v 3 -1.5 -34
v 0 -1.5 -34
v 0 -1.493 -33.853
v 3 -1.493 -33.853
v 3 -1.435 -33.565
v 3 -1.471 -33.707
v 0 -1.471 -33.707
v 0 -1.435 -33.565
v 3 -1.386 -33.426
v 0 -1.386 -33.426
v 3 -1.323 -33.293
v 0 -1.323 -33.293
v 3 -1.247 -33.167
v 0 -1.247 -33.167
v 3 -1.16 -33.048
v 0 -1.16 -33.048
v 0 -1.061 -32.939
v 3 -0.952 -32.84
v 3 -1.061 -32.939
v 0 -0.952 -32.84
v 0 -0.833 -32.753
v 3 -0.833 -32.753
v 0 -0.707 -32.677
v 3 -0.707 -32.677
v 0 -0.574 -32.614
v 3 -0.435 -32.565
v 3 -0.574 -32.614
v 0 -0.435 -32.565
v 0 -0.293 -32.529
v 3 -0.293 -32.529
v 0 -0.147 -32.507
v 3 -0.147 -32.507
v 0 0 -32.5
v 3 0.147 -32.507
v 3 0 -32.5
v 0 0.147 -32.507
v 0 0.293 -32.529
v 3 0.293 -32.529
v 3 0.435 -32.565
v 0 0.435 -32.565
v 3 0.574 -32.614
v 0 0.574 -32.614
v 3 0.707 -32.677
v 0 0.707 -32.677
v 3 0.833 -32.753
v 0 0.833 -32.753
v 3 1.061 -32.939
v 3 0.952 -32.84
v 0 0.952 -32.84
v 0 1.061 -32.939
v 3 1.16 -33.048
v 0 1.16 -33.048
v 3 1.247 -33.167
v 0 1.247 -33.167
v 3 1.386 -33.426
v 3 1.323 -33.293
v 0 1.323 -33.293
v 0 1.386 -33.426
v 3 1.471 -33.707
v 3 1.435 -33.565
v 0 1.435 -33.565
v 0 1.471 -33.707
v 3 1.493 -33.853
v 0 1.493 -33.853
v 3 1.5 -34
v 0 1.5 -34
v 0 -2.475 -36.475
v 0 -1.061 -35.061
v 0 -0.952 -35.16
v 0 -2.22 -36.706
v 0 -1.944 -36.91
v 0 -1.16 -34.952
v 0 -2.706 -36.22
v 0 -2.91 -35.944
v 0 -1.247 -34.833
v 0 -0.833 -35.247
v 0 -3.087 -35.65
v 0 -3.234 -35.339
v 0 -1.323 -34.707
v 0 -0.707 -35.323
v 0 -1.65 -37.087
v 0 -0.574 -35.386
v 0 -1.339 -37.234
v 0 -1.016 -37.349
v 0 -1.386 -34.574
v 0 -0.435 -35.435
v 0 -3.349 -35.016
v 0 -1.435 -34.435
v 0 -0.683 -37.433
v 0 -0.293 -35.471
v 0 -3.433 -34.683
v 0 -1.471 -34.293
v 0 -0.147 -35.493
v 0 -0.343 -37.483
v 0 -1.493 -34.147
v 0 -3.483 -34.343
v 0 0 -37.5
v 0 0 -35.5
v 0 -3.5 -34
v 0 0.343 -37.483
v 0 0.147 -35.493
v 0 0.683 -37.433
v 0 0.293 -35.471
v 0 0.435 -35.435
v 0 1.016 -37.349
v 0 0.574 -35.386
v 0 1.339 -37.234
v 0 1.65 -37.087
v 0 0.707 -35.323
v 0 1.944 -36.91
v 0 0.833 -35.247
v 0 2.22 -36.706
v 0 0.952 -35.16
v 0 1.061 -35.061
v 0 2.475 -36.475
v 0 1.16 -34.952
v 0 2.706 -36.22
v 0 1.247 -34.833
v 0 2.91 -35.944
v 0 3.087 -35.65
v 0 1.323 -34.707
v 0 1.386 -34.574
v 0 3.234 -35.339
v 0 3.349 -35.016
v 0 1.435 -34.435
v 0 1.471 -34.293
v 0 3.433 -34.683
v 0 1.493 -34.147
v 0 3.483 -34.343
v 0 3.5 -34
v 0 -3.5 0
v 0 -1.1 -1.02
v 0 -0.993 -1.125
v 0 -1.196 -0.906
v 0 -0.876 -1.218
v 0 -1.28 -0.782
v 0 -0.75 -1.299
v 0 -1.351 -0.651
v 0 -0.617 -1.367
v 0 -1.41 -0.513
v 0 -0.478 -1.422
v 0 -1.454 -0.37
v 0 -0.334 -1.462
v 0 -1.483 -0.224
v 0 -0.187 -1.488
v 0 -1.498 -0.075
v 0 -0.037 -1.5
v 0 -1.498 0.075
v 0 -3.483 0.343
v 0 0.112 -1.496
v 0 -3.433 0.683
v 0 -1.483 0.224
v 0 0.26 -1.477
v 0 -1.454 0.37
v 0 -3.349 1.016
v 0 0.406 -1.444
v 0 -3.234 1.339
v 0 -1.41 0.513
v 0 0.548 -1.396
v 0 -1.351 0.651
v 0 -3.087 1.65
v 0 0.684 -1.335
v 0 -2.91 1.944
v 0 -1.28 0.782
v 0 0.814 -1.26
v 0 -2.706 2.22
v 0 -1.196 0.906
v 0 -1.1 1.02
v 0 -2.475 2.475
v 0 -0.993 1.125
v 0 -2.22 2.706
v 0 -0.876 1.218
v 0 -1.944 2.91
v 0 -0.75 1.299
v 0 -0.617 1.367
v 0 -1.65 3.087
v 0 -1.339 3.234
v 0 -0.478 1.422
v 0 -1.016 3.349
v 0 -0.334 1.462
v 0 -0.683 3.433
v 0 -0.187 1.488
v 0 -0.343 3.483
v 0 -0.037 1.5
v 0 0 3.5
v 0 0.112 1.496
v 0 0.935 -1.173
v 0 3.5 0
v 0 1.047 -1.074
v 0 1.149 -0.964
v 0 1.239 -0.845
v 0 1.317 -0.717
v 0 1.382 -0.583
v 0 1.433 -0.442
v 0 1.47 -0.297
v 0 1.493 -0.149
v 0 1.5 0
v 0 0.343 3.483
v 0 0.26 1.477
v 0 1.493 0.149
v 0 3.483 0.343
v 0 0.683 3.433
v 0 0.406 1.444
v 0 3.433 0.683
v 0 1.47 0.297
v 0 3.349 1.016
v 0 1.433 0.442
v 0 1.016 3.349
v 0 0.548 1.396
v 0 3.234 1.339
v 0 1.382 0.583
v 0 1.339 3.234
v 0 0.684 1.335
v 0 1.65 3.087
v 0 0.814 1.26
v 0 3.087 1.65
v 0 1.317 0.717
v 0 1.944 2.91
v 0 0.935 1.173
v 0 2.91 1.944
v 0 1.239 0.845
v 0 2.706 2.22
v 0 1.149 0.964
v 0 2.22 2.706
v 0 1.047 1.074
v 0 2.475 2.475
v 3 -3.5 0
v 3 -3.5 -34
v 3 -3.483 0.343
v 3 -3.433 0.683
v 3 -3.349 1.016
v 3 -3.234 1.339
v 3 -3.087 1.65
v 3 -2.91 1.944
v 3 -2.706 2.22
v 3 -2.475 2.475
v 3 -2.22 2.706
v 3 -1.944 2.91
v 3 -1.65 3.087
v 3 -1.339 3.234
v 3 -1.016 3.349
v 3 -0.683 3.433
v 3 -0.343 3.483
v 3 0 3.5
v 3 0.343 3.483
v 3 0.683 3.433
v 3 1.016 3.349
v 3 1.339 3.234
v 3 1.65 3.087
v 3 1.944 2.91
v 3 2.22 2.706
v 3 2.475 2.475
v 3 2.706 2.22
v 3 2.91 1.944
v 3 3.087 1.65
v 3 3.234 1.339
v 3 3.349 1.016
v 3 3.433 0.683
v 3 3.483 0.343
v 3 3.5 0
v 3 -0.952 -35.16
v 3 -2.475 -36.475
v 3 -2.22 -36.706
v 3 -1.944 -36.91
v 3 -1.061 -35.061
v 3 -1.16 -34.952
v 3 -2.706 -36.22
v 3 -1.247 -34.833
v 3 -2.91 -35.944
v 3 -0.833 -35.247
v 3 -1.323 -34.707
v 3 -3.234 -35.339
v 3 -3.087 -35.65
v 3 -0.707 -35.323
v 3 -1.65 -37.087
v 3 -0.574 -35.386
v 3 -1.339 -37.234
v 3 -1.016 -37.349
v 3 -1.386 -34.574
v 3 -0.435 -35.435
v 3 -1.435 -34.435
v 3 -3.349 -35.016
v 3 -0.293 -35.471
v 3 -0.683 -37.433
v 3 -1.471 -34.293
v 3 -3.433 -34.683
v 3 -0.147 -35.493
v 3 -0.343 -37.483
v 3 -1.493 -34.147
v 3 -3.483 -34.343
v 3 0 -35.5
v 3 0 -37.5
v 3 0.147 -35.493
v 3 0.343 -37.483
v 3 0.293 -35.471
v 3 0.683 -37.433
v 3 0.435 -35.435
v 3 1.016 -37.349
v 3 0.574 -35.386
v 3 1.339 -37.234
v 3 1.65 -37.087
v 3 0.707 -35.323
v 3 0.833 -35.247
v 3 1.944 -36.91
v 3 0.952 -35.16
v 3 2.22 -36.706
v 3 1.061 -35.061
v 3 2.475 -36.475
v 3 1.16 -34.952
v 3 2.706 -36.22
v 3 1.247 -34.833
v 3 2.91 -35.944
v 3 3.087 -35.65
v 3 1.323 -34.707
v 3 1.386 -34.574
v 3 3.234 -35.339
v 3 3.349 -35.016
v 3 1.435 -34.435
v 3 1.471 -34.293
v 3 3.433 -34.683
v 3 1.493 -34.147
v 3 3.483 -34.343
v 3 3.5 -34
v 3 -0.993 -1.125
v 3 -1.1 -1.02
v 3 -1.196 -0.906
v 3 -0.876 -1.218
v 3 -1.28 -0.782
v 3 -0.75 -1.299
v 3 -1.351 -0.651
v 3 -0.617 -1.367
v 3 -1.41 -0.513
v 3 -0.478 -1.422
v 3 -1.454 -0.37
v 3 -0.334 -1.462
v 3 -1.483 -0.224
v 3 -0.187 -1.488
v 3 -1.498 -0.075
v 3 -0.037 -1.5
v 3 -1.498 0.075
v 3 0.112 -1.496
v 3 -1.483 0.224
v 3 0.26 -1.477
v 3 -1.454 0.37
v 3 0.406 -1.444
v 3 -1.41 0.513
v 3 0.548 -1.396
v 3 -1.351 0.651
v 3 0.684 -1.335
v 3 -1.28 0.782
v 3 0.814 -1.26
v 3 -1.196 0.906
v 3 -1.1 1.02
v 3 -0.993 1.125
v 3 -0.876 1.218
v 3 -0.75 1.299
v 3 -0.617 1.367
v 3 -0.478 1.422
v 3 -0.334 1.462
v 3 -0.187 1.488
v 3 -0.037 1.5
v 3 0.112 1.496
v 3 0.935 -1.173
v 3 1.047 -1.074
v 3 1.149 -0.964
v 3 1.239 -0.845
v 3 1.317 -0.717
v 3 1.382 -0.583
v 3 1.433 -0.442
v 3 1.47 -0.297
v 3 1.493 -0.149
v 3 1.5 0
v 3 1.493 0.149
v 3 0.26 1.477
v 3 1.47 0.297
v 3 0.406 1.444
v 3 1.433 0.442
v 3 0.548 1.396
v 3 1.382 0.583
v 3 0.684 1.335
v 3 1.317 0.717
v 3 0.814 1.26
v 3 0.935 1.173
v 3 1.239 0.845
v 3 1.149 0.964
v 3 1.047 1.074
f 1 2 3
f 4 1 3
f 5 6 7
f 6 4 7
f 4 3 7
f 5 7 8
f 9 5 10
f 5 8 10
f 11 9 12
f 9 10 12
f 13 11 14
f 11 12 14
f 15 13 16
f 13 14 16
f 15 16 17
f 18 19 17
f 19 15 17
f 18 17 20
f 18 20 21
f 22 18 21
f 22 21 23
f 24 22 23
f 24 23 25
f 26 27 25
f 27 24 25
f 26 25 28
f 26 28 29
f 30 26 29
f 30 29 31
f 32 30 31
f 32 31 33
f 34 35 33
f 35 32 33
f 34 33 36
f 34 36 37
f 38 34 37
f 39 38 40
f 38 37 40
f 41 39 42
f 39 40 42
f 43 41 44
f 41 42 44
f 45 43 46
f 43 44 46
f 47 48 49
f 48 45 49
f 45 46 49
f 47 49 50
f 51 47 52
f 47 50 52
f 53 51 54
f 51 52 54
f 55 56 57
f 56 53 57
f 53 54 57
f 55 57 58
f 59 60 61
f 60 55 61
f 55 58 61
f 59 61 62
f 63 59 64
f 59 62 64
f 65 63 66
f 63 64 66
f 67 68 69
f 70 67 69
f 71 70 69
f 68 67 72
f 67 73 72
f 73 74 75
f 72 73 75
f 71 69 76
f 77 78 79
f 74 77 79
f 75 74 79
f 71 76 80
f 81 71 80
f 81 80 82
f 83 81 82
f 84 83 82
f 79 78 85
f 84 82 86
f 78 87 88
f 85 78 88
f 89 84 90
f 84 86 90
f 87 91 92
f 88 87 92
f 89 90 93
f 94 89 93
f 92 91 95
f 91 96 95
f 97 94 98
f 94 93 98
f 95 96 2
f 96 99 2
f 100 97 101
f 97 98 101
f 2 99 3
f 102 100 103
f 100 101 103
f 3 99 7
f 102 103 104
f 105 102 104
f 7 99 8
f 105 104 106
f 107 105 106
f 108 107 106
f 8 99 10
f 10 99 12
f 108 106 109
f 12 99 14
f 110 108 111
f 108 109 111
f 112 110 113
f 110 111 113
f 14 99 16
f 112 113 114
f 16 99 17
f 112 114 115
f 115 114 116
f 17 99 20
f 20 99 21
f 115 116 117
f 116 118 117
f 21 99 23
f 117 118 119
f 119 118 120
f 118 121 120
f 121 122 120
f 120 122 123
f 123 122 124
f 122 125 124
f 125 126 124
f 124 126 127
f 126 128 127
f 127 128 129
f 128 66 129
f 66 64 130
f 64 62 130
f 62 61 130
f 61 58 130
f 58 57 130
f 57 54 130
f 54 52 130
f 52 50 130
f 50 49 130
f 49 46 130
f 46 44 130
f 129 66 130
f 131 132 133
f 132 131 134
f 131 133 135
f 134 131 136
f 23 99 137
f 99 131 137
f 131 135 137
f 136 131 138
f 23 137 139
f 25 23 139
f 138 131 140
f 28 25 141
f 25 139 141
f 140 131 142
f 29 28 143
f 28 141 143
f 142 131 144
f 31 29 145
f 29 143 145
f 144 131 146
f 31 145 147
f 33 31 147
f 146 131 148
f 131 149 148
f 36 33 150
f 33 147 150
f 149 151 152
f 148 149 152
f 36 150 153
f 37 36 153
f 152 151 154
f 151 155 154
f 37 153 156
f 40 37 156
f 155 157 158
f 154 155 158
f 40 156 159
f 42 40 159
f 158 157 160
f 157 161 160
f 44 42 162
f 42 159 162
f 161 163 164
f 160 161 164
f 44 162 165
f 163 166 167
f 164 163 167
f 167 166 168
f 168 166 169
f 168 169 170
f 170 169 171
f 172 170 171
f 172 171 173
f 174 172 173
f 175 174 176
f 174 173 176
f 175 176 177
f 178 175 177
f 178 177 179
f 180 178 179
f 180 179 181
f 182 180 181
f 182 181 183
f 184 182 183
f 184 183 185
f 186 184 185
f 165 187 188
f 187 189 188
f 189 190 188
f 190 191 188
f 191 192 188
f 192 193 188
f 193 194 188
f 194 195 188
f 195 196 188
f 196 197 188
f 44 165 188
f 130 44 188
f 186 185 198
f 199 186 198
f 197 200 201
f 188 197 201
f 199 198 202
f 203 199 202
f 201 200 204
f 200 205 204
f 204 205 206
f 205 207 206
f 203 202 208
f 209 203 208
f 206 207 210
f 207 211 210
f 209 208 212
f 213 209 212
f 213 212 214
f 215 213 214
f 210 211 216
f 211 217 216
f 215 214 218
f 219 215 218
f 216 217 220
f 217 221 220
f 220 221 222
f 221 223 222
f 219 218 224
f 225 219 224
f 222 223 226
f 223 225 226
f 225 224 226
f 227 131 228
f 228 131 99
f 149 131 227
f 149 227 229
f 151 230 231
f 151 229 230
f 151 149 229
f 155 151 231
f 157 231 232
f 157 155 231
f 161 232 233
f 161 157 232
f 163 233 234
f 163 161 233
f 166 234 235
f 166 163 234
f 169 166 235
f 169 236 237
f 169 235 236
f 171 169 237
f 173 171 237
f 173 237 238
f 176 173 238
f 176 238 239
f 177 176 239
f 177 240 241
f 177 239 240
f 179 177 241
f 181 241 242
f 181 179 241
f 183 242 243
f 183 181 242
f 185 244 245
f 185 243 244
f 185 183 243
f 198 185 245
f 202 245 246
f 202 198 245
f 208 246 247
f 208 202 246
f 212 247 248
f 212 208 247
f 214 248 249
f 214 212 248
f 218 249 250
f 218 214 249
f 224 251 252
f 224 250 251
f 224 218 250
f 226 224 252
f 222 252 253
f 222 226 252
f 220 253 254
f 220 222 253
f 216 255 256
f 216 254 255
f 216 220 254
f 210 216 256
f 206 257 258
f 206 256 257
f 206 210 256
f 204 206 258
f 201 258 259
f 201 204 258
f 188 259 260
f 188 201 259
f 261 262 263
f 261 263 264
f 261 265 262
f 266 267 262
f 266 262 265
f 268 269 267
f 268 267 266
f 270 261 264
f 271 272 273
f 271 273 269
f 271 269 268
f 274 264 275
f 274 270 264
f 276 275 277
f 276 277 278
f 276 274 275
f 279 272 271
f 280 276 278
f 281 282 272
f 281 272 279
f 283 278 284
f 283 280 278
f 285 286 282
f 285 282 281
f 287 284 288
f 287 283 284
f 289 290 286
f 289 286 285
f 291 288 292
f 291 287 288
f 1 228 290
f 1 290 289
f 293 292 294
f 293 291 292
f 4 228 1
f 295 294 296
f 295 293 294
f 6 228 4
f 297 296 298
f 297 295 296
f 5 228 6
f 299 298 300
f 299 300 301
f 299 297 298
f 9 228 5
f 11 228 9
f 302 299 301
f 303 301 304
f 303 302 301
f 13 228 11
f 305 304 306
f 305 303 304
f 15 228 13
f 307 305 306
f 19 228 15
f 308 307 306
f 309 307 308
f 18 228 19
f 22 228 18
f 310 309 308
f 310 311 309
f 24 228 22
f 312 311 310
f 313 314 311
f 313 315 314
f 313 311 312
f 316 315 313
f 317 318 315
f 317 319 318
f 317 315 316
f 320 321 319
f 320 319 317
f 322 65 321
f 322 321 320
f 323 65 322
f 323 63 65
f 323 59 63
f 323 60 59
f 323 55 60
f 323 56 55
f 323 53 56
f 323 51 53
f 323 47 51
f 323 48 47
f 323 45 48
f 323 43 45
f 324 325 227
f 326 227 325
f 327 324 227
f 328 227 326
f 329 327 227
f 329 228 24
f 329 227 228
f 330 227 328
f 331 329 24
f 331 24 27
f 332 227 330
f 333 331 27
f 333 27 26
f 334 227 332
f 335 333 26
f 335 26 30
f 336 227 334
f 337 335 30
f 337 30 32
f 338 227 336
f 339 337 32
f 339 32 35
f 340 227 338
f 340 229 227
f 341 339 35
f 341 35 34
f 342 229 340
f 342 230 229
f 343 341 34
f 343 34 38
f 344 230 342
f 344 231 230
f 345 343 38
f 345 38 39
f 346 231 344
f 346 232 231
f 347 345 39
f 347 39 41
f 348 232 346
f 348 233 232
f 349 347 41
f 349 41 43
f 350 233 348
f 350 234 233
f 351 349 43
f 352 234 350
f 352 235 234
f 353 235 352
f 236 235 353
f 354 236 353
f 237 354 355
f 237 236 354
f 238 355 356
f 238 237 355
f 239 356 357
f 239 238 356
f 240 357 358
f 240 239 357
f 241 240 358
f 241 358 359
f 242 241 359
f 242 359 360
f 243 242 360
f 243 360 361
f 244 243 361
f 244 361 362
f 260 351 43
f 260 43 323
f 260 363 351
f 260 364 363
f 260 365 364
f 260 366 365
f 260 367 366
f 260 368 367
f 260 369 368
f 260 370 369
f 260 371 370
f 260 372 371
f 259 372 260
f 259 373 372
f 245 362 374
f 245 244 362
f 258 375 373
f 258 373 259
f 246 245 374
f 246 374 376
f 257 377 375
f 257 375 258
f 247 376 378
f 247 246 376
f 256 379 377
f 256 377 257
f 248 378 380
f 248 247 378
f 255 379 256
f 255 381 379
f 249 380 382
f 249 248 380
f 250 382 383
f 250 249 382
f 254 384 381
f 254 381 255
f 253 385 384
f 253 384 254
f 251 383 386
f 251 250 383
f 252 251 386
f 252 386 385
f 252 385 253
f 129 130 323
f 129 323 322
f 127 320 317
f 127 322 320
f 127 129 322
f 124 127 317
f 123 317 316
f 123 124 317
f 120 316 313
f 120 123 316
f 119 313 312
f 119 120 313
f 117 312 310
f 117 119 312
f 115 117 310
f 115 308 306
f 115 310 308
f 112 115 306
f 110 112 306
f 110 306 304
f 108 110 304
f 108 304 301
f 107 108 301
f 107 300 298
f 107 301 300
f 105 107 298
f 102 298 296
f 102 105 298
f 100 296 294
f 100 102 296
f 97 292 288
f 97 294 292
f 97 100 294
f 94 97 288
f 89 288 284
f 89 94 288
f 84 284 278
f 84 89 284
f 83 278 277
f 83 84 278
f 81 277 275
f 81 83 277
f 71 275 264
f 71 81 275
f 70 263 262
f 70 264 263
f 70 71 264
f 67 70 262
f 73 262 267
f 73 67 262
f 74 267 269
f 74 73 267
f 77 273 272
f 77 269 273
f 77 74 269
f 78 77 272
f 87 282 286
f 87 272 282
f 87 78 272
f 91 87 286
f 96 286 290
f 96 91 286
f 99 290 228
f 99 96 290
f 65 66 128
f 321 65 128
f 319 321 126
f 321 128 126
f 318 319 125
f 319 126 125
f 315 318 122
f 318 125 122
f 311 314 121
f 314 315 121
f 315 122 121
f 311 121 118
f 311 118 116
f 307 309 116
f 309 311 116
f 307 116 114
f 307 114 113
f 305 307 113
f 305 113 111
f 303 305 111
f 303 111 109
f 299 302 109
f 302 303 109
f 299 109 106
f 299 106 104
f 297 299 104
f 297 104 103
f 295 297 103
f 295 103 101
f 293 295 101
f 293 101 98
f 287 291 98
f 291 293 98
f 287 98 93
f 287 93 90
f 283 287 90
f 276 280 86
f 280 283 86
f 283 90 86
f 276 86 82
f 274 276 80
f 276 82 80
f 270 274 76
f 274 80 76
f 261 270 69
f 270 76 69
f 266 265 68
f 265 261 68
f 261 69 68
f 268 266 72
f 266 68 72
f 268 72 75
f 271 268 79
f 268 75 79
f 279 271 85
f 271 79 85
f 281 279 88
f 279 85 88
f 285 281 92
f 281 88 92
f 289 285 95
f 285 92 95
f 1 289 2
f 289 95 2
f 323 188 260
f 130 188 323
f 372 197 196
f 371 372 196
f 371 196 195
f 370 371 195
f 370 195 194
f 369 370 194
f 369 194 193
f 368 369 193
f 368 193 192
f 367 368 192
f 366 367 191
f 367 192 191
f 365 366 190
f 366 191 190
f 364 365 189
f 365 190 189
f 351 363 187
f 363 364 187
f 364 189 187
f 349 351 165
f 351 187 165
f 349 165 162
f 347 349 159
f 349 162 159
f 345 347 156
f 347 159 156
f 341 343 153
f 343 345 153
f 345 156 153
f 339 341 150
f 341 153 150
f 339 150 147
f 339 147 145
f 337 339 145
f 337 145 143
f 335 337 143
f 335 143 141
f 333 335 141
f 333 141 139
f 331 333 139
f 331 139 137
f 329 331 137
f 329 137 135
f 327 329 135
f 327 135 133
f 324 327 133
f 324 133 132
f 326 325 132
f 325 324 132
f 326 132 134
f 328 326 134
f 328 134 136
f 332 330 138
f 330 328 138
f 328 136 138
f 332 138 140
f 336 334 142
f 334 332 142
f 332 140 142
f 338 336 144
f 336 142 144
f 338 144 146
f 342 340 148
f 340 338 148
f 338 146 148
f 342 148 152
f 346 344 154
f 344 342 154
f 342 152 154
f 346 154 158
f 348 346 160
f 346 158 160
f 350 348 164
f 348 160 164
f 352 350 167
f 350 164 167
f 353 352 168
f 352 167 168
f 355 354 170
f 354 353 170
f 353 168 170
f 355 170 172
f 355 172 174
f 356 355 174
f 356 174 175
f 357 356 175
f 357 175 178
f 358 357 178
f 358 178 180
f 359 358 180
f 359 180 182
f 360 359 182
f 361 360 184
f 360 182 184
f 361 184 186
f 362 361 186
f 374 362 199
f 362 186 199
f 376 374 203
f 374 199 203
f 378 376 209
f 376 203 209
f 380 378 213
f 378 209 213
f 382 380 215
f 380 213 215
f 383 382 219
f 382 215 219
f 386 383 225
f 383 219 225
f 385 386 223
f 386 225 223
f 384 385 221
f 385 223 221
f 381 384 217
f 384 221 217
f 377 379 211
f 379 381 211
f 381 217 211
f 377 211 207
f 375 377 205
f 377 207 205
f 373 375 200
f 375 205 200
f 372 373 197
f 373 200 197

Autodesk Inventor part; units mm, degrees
ref_plane "YZ Plane" through (0, 0, 0) normal (1, 0, 0) x (0, 1, 0)
ref_plane "XZ Plane" through (0, 0, 0) normal (0, 1, 0) x (-1, 0, 0)
ref_plane "XY Plane" through (0, 0, 0) normal (0, 0, 1) x (1, 0, 0)
sketch "Sketch1" plane through (0, 0, 0) normal (1, 0, 0) x (0, 1, 0)
  circle A0 centre (0, 0) radius 1.5
  arc A1 (3.5, 0) -> (-3.5, 0) centre (0, 0) ccw
  line L0 (3.5, 0) -> (3.5, -34)
  line L1 (-3.5, 0) -> (-3.5, -34)
  line L2 (-3.5, -34) -> (0, -34)
  circle A2 centre (0, -34) radius 1.5
  arc A3 (-3.5, -34) -> (3.5, -34) centre (0, -34) ccw
  dimension "d0" = 3
  dimension "d1" = 7
  dimension "d2" = 34
  dimension "d3" = 34
  dimension "d4" = 3
extrude "Extrusion1" add sketch "Sketch1" along normal blind 3
properties part number "union_acr"
